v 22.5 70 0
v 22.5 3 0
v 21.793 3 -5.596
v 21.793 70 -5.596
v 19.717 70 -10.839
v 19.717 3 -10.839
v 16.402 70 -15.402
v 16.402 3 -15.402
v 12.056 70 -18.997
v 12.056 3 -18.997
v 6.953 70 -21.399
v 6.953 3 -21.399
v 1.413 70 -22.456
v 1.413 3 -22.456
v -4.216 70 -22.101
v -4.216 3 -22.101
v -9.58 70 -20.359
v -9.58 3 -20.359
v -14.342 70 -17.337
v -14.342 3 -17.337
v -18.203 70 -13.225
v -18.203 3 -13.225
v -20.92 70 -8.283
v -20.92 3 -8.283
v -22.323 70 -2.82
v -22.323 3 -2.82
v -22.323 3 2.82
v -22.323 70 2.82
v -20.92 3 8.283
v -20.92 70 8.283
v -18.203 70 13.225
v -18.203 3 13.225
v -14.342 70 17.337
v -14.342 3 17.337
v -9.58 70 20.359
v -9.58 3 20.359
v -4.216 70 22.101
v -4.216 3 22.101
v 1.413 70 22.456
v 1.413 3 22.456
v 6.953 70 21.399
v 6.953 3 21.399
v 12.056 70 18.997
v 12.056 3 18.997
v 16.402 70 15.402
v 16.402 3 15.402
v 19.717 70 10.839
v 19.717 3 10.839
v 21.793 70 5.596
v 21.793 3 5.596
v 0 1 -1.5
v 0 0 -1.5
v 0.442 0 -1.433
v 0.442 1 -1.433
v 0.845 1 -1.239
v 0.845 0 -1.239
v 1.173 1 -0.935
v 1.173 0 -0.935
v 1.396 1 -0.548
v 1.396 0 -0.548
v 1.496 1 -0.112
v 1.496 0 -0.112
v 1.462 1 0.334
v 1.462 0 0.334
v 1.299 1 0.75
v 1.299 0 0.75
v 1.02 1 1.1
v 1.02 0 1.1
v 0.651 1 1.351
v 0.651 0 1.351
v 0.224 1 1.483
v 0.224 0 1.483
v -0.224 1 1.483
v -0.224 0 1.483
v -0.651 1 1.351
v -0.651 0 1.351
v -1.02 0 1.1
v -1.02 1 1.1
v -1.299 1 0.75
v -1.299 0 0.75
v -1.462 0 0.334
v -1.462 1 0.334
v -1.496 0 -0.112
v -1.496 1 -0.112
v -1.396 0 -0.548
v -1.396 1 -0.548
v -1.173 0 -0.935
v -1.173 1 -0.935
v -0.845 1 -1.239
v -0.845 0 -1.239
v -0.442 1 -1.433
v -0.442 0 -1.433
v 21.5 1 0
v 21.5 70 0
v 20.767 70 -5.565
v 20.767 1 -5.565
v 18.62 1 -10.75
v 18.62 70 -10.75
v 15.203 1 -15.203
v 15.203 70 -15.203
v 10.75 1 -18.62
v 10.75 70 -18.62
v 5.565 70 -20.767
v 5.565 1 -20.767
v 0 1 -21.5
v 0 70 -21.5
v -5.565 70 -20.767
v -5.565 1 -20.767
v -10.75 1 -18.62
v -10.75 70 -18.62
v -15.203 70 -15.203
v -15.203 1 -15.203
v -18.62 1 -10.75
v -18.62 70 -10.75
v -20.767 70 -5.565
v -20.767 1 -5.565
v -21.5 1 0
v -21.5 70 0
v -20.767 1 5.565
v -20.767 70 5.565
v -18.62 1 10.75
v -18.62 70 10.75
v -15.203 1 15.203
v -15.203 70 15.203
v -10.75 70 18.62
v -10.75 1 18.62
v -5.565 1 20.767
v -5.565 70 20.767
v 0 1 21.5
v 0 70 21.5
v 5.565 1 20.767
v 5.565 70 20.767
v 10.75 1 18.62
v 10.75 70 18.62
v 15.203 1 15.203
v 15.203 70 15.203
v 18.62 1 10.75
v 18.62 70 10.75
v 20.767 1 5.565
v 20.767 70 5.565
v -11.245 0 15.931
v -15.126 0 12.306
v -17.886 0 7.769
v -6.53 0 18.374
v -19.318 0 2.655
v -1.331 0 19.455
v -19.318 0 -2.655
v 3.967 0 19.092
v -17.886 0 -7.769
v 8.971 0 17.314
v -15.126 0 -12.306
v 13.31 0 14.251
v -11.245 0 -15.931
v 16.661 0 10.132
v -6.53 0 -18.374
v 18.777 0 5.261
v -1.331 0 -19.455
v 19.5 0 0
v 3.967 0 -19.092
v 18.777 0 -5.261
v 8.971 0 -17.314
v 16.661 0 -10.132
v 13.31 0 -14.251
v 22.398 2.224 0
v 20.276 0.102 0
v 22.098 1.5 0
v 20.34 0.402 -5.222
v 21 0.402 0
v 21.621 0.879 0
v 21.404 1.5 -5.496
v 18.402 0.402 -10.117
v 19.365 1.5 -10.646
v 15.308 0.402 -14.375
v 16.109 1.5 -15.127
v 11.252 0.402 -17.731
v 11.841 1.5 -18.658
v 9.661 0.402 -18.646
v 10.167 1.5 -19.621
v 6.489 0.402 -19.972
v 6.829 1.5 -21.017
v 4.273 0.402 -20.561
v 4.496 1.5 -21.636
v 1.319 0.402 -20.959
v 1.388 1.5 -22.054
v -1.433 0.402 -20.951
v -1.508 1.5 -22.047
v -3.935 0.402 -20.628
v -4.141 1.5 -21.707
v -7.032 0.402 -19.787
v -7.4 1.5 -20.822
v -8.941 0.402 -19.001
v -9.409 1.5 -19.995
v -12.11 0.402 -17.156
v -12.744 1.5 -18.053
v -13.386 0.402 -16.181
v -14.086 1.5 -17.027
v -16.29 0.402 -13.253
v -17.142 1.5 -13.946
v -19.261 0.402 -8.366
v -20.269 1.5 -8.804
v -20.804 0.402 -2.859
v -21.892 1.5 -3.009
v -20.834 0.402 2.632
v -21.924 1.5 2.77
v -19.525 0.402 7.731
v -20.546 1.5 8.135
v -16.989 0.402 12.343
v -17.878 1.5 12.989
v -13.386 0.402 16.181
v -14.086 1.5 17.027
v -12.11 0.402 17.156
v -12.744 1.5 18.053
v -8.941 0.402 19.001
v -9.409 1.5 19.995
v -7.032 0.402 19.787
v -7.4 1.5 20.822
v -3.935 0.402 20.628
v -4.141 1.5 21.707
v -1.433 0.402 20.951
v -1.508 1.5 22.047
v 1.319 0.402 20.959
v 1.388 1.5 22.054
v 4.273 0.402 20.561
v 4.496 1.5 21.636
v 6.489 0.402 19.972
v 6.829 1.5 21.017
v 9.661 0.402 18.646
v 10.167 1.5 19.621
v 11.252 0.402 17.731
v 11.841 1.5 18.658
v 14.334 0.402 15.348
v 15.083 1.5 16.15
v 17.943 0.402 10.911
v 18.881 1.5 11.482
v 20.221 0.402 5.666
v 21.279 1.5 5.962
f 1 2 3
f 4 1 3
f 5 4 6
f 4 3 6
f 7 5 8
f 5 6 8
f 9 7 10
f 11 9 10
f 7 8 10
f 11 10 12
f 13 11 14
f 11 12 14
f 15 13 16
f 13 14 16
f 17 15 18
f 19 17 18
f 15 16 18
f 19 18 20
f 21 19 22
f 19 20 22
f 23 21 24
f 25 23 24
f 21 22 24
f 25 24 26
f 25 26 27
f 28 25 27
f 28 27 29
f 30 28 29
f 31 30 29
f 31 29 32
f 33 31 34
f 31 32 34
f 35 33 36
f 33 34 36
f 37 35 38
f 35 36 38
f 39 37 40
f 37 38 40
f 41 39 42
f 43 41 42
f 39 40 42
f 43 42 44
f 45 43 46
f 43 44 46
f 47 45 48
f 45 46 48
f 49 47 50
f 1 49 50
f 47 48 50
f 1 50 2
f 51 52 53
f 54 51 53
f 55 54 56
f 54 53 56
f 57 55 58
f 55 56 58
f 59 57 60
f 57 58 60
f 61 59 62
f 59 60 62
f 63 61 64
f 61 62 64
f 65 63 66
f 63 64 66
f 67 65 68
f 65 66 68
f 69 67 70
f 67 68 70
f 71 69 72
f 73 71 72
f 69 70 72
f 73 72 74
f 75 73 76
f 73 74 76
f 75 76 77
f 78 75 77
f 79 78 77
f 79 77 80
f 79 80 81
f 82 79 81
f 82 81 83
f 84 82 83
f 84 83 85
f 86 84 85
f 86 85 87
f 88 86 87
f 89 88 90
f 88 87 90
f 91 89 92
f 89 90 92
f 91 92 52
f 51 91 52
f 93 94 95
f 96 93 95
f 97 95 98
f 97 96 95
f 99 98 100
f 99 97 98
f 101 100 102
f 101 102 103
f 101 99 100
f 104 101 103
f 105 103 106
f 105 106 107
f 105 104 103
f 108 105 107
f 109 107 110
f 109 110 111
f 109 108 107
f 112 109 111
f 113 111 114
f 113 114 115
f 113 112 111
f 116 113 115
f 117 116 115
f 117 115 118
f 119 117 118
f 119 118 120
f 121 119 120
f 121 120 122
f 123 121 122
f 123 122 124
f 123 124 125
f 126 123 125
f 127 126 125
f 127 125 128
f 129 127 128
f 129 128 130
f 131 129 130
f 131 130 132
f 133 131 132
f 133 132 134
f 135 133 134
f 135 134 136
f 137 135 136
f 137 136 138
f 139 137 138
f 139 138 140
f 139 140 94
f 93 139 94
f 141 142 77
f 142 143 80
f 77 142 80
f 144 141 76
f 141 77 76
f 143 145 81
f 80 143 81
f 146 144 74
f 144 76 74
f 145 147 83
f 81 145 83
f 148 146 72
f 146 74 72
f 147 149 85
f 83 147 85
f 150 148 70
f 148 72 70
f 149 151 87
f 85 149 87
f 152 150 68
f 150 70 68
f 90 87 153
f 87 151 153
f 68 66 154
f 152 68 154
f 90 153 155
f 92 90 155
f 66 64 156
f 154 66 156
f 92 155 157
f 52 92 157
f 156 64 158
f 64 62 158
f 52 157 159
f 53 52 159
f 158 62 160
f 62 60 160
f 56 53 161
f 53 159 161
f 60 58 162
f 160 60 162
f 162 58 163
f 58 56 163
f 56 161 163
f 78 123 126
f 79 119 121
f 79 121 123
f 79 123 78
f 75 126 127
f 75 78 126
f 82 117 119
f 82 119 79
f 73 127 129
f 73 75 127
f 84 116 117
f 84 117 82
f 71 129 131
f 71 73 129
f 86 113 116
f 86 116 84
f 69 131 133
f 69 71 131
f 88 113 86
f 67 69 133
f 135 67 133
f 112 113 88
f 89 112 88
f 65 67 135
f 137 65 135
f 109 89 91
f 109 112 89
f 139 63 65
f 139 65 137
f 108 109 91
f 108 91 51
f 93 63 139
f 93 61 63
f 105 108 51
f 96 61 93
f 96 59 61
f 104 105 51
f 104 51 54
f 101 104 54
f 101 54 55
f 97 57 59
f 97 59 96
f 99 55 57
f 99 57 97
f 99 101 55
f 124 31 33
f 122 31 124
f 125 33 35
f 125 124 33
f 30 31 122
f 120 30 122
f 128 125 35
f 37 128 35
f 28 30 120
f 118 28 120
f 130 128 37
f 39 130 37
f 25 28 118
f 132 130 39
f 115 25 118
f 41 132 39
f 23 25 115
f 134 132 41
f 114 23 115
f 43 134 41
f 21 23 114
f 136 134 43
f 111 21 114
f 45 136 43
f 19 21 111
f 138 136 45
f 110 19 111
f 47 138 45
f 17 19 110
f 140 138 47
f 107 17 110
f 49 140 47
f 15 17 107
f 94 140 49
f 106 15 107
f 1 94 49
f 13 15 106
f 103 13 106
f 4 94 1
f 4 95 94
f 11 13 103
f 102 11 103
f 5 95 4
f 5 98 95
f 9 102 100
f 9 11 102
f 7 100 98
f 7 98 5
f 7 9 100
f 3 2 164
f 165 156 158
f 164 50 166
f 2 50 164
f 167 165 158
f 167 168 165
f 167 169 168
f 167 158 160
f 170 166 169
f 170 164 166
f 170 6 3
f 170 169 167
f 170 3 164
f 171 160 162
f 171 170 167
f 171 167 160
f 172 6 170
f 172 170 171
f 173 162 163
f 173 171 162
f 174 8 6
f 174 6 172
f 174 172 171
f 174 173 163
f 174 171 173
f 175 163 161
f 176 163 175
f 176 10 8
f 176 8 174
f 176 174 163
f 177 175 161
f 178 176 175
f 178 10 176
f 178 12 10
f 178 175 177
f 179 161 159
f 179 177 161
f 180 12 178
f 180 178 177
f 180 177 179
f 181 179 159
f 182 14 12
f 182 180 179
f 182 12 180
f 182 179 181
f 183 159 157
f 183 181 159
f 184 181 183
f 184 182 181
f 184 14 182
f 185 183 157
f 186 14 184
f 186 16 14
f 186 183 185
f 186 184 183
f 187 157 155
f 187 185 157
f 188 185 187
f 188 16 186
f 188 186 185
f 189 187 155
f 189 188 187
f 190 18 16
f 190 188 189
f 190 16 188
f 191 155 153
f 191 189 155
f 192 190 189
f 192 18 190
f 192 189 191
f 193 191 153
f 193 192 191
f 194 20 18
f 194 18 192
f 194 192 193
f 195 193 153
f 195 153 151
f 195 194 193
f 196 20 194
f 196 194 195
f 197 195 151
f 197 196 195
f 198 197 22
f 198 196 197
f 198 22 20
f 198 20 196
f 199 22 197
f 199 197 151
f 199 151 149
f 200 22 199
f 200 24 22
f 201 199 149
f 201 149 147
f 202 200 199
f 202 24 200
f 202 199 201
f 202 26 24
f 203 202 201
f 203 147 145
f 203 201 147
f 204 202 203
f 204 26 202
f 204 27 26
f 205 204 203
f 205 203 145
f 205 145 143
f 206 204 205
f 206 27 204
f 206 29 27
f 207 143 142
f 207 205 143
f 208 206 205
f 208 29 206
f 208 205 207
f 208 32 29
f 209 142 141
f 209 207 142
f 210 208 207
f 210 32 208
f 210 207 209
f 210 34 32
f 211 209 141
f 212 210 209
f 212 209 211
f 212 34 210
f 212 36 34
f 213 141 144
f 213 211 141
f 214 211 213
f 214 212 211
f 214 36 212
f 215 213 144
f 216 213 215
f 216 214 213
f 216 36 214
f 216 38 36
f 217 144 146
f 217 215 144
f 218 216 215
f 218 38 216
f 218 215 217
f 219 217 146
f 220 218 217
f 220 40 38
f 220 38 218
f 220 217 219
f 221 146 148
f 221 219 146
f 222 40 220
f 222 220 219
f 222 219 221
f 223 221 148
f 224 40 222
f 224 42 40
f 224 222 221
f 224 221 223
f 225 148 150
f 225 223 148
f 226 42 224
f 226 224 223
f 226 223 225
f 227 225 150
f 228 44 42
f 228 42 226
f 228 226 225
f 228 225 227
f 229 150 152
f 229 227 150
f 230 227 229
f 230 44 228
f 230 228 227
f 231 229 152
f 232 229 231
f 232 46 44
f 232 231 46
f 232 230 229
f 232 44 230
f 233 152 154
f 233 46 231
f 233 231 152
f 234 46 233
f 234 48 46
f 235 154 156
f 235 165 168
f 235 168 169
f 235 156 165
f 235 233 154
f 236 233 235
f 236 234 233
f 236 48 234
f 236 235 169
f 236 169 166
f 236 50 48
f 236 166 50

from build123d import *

# Parameters (mm, degrees)
SKETCH1_R           = 22.5
SKETCH1_R_2         = 21.5
EXTRUDE_THIN1_DEPTH = 70
SKETCH1_3_R         = 21.5
BOSS_EXTRUDE1_DEPTH = 1
FILLET1_R           = 3
SKETCH2_R           = 1.5
CUT_EXTRUDE1_DEPTH  = 1


with BuildPart() as part:
    # Sketch1 → Extrude-Thin1 (new body)
    with BuildSketch(Plane(origin=(0, 0, 0), x_dir=(1, 0, 0), z_dir=(0, 1, 0))):
        Circle(SKETCH1_R)
        Circle(SKETCH1_R_2, mode=Mode.SUBTRACT)
    extrude(amount=EXTRUDE_THIN1_DEPTH)

    # Sketch1<3> → Boss-Extrude1 (add)
    with BuildSketch(Plane(origin=(0, 0, 0), x_dir=(1, 0, 0), z_dir=(0, 1, 0))):
        Circle(SKETCH1_3_R)
    extrude(amount=BOSS_EXTRUDE1_DEPTH)

    # Fillet1
    fillet1_edges = [part.edges().sort_by_distance(p)[0] for p in [
        (-22.5, 0, 0),
    ]]
    fillet(fillet1_edges, radius=FILLET1_R)

    # Sketch2 → Cut-Extrude1 (cut)
    with BuildSketch(Plane.XZ):
        with Locations(Location((0, 0, 0), (0, 0, 270))):
            Circle(SKETCH2_R)
    extrude(amount=-CUT_EXTRUDE1_DEPTH, mode=Mode.SUBTRACT)


solid = part.part
